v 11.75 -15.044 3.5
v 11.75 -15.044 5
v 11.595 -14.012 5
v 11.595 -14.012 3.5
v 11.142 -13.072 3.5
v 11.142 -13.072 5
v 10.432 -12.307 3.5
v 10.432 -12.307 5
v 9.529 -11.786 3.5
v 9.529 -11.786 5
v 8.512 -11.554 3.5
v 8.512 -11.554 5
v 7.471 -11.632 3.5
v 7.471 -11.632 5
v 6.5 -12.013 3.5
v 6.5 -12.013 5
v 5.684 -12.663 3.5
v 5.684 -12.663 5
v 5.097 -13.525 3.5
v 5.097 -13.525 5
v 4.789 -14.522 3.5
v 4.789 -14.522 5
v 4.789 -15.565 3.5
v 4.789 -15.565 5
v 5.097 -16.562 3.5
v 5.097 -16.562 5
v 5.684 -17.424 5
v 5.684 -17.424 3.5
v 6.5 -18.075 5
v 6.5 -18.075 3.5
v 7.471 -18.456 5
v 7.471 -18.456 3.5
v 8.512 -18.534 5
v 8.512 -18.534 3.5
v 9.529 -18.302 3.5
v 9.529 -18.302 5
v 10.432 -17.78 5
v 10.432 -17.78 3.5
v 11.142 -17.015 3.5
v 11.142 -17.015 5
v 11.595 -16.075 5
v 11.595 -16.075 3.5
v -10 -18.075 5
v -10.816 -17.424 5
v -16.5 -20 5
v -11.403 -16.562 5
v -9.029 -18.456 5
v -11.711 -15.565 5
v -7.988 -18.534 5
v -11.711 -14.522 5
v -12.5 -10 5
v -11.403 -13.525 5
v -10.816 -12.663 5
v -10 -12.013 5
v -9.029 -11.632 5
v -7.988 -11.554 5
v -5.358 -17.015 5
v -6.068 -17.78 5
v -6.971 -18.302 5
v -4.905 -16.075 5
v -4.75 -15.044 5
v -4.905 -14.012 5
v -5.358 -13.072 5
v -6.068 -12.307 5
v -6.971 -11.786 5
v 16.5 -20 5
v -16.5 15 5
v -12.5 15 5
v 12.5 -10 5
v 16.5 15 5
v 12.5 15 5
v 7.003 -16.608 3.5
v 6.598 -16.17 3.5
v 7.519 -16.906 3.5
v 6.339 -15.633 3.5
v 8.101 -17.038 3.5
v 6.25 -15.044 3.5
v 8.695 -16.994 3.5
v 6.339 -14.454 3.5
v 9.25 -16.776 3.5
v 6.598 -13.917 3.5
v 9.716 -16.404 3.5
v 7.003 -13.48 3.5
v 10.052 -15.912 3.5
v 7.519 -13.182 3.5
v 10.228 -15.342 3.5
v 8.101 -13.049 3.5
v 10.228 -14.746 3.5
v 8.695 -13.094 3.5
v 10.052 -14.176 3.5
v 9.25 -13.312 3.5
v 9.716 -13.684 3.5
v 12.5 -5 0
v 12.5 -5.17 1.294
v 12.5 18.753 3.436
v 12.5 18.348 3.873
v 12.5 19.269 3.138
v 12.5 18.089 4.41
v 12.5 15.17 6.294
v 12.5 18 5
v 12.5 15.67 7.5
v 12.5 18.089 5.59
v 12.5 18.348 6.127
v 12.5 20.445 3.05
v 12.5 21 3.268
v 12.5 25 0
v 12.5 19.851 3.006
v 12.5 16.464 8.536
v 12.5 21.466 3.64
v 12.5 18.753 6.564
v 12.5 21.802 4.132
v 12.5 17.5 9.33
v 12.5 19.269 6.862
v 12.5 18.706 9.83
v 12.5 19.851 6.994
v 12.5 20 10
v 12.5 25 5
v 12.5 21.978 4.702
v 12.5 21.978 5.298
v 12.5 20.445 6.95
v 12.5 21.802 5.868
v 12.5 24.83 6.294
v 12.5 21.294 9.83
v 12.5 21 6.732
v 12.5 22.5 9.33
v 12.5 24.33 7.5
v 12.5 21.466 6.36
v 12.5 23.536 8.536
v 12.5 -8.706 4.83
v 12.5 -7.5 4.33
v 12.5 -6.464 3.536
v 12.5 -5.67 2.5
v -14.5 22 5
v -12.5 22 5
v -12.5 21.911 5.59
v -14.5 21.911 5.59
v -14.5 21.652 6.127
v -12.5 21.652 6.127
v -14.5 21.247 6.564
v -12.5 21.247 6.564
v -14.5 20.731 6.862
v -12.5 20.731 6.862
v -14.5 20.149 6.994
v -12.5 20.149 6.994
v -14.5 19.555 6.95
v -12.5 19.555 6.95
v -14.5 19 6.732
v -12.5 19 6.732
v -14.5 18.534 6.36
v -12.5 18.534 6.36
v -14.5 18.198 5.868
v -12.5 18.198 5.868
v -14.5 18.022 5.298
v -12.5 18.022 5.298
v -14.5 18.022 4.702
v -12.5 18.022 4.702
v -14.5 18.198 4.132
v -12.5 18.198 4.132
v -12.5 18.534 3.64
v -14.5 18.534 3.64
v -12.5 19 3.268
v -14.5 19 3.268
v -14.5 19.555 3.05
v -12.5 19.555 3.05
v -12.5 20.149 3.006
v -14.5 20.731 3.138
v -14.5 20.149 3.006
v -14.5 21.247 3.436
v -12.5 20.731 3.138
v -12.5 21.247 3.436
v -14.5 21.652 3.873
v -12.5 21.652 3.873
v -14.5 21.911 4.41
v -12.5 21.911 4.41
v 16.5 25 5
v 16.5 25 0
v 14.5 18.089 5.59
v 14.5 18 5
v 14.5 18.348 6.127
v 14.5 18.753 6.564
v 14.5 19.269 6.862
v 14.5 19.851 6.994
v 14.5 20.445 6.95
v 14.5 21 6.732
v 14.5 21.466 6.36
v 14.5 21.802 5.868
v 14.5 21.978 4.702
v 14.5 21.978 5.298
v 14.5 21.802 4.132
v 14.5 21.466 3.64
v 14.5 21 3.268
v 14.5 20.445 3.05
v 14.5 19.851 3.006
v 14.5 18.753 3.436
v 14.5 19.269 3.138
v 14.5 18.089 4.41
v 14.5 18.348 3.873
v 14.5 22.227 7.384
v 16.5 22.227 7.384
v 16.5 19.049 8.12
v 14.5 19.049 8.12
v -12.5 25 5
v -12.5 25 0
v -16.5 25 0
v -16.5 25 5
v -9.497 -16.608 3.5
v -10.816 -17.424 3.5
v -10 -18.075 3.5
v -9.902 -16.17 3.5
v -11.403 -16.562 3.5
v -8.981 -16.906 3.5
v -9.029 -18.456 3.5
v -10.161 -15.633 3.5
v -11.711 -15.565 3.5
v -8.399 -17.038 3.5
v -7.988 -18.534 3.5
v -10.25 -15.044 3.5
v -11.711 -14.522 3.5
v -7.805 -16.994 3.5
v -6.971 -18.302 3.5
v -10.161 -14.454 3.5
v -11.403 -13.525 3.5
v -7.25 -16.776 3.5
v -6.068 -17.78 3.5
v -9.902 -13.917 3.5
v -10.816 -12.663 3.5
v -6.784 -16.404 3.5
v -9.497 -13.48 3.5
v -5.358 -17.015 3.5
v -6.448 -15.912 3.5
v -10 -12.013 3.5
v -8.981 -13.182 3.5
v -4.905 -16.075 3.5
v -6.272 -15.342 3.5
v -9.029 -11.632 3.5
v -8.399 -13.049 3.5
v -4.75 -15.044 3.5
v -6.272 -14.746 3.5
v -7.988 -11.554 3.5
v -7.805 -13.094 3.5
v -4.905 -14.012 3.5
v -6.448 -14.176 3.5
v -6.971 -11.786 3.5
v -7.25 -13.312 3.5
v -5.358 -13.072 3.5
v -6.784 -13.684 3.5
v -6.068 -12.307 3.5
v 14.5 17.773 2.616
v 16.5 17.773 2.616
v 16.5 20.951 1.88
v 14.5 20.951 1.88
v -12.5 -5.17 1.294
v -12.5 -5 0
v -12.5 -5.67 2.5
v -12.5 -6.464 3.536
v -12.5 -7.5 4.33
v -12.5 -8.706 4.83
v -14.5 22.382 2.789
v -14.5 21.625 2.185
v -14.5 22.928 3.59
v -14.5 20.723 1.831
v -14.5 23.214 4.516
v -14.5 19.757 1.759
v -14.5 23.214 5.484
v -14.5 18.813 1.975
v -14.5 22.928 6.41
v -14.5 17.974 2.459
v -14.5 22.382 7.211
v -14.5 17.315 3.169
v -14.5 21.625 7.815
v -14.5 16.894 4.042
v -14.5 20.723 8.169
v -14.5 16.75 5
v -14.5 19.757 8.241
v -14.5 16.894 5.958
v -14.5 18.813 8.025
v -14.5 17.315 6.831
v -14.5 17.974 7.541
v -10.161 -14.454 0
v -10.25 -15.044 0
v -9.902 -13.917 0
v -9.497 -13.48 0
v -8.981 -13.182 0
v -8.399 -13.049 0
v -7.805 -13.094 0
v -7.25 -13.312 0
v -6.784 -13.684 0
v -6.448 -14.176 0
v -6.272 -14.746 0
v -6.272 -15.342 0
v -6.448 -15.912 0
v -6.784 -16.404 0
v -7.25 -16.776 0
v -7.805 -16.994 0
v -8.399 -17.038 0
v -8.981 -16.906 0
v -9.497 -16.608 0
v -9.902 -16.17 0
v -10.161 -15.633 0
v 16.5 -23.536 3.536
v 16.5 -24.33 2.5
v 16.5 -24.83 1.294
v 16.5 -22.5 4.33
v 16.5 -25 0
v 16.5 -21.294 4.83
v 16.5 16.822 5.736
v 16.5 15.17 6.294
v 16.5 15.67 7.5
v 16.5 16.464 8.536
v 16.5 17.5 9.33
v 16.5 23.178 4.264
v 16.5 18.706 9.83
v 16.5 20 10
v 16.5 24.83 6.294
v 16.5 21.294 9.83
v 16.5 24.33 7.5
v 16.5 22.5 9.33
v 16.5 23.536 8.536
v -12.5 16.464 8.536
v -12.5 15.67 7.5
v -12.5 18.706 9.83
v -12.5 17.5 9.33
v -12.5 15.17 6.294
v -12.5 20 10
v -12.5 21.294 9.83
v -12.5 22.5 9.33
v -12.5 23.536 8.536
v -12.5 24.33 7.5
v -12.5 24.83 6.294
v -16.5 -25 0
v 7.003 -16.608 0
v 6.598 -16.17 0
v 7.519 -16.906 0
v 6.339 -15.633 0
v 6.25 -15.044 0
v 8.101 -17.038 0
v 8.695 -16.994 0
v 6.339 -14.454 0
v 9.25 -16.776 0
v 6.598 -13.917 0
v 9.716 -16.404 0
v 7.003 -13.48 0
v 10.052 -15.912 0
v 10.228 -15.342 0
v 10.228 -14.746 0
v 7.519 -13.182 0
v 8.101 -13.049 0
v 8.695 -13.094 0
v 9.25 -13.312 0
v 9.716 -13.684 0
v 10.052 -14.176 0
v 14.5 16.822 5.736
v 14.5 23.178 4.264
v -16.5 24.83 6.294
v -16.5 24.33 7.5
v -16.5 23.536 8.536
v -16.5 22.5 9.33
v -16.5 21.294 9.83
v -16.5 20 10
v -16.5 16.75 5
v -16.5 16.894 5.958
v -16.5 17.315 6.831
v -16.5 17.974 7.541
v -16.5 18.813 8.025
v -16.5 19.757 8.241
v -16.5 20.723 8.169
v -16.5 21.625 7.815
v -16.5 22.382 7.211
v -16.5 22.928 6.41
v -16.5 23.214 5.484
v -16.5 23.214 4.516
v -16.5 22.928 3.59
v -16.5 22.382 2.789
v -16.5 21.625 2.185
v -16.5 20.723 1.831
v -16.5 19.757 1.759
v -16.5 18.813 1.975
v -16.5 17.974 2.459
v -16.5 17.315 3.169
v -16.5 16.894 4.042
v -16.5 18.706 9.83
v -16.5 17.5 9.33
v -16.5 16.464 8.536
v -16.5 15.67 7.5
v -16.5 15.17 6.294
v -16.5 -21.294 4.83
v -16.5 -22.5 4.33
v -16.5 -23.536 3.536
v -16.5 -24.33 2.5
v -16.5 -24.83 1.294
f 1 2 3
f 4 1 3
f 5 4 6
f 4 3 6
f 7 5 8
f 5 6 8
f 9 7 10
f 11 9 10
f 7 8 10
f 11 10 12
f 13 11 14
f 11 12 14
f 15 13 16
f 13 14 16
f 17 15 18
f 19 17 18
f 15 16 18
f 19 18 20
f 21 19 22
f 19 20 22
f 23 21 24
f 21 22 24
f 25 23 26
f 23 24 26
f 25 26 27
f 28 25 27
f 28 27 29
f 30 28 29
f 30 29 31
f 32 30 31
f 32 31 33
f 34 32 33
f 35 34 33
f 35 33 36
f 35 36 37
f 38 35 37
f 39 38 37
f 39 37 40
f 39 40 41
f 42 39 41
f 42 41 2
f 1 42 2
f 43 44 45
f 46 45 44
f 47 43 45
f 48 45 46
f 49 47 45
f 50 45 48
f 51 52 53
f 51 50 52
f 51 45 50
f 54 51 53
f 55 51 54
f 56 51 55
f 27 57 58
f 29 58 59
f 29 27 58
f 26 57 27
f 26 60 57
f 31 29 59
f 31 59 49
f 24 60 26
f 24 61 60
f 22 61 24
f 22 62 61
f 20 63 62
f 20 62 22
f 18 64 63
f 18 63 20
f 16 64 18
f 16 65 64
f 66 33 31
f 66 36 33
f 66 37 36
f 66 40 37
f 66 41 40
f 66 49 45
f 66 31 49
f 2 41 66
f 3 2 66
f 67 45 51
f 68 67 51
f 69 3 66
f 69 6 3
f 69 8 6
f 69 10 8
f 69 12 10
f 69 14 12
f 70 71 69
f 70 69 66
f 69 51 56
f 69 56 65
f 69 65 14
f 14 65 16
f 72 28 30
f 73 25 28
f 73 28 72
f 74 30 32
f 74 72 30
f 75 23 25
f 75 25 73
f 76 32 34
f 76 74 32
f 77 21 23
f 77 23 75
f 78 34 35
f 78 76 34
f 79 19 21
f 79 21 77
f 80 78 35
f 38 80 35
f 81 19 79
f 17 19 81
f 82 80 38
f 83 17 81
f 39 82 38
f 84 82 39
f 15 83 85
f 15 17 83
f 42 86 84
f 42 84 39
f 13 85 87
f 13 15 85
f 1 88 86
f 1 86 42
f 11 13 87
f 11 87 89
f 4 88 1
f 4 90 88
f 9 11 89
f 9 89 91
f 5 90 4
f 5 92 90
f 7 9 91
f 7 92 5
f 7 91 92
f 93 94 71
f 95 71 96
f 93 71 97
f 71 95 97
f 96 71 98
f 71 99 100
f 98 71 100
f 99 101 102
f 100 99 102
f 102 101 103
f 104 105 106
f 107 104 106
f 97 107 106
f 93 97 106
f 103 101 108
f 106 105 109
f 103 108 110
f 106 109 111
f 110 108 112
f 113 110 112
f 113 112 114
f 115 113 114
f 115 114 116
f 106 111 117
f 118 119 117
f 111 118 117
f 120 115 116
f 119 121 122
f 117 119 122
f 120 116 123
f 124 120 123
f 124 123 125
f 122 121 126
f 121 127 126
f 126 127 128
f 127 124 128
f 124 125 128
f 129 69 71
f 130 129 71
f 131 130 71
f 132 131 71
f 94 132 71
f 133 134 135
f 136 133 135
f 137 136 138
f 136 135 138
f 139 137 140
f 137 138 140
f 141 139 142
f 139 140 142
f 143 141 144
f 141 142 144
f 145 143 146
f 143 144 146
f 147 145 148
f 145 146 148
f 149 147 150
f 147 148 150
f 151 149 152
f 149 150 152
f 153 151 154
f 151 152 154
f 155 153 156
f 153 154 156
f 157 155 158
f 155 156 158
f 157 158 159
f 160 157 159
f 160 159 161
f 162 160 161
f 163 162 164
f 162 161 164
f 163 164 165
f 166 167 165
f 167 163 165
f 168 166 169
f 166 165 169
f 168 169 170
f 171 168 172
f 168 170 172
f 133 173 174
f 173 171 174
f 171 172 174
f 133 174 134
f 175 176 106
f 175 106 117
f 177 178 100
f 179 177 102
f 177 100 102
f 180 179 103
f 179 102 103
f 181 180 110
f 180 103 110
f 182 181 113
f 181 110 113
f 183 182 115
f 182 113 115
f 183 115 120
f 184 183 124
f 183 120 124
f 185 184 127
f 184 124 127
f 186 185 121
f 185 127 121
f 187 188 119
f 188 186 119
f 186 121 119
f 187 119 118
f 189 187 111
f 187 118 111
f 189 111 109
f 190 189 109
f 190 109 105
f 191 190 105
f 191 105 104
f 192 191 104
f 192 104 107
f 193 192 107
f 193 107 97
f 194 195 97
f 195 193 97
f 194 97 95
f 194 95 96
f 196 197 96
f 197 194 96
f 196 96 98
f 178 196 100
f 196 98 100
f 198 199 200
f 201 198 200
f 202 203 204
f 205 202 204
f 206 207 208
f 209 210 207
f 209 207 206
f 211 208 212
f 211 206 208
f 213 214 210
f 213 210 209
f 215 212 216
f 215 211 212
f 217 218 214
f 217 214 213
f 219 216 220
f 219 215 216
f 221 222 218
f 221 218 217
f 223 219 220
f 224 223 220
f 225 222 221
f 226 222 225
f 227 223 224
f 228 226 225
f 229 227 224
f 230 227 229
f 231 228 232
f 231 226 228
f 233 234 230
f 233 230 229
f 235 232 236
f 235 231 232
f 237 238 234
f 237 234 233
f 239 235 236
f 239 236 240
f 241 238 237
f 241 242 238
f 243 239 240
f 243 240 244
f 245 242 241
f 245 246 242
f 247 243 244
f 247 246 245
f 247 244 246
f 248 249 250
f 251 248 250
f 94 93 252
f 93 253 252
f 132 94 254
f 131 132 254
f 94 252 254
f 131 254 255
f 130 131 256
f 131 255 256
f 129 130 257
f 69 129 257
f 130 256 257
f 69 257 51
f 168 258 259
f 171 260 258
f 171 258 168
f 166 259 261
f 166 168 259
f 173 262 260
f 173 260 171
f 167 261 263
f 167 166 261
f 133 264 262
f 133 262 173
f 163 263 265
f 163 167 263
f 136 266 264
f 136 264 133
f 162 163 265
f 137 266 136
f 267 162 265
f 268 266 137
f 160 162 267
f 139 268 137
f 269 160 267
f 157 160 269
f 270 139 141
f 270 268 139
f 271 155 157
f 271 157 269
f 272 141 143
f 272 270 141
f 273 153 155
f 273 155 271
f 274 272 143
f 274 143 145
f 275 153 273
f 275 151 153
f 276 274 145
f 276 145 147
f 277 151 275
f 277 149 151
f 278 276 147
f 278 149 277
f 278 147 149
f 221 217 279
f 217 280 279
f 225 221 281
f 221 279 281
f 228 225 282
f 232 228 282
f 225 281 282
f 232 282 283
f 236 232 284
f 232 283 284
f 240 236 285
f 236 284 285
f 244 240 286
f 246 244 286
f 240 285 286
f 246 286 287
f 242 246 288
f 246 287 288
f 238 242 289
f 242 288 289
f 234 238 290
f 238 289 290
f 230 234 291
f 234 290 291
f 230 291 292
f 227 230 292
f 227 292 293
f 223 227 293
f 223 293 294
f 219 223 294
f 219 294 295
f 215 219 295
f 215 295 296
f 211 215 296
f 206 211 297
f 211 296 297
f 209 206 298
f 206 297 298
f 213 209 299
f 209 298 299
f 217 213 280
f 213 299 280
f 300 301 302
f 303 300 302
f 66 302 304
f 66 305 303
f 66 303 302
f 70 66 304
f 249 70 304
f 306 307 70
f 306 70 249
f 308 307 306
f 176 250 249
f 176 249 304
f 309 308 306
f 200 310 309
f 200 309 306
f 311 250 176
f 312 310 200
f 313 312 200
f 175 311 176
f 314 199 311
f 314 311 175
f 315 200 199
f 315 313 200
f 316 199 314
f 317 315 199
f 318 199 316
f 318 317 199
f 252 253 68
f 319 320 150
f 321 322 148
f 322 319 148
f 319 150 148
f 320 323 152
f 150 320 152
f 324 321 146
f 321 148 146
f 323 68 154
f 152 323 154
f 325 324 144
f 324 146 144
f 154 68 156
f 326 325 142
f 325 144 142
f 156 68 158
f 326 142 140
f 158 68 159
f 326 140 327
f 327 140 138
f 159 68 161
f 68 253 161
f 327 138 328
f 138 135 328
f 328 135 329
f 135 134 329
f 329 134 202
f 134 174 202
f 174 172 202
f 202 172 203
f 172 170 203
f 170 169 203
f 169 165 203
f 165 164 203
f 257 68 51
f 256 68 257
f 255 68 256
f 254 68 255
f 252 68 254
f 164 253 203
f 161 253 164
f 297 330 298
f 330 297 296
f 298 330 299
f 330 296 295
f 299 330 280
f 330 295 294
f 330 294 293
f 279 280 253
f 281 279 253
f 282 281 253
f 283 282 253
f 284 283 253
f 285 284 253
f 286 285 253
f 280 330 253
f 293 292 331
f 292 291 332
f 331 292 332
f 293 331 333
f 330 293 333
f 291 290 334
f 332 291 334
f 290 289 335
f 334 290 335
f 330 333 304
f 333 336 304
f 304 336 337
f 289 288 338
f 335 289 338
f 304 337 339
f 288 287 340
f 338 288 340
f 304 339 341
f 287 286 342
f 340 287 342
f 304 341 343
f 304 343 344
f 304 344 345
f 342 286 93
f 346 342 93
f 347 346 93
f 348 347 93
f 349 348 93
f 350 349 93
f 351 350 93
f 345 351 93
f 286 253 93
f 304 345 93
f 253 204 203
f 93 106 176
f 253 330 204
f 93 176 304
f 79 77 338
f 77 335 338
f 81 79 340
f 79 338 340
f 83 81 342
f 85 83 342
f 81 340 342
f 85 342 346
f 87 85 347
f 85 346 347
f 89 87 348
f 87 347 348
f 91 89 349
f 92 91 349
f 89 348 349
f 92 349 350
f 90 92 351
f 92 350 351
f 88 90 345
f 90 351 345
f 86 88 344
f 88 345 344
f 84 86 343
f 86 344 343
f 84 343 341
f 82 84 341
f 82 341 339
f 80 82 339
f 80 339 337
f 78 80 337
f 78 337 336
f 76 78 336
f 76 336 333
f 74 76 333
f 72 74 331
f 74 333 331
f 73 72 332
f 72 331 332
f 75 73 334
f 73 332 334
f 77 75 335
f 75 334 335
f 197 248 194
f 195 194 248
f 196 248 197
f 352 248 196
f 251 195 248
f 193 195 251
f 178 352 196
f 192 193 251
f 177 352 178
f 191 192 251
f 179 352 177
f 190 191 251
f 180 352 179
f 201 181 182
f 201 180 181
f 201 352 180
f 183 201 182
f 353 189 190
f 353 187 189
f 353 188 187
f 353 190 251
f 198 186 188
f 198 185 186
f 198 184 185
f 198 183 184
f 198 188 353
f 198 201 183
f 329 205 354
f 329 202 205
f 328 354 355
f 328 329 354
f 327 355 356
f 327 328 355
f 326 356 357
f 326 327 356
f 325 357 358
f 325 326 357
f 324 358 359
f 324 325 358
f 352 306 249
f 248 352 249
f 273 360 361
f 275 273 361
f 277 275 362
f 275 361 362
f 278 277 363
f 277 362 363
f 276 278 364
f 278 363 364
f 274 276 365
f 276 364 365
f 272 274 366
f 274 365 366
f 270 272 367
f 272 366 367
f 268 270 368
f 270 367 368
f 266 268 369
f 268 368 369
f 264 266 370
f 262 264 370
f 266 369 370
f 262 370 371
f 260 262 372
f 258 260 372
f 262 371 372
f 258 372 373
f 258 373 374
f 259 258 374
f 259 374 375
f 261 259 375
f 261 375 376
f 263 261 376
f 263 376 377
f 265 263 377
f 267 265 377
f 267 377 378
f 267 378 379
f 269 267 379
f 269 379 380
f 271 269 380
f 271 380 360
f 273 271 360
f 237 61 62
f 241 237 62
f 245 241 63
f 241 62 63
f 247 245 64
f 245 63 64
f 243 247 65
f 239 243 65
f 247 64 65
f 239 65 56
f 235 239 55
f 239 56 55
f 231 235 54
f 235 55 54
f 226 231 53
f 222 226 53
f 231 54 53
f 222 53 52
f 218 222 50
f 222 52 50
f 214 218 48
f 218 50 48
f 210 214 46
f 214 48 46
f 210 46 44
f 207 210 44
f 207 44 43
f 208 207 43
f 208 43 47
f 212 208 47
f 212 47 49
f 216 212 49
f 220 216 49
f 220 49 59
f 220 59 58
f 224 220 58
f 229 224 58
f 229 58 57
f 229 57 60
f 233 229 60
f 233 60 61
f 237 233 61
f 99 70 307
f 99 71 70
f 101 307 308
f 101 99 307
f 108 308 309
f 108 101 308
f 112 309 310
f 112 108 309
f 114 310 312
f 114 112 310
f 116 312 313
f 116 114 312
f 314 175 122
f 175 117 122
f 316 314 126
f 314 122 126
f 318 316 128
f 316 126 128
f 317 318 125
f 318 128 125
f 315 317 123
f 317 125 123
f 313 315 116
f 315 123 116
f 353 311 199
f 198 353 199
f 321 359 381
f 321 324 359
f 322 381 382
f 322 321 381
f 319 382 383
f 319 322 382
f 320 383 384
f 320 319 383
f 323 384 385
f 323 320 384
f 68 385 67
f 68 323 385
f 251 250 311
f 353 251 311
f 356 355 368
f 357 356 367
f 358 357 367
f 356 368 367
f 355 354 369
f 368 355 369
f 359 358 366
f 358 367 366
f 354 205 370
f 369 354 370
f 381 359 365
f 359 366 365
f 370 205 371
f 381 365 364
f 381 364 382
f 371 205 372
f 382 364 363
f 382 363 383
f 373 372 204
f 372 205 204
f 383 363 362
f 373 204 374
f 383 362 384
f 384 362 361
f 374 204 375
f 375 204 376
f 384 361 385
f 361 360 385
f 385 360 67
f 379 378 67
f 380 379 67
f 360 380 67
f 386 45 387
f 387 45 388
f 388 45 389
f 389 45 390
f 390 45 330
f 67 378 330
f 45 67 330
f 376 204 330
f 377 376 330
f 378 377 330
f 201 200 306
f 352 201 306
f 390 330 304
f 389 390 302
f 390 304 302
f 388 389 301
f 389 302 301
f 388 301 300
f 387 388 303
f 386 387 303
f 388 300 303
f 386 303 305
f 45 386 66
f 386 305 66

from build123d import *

# Parameters (mm, degrees)
F1_DEPTH        = 5
F2_W            = 10
F2_H            = 10
F3_DEPTH        = 4
F5_D            = 4
F5_CBORE_D      = 6.5
F5_CBORE_DEPTH  = 2
F7_DEPTH        = 4
F9_D            = 4
F10_R           = 2
F11_DEPTH       = 2
F12_R           = 4.99999
F14_D           = 4
F14_CBORE_D     = 7
F14_CBORE_DEPTH = 1.5


# Not quite as in the source:
# - a fillet or chamfer is up to 0.001 mm smaller than in the source, because OpenCascade refuses the exact size


with BuildPart() as f1:
    # F0 (on Top) → F1 (new body)
    with BuildSketch(Plane.XY):
        Polygon((16.5, -25), (16.5, 25), (12.5, 25), (12.5, -5), (-12.5, -5), (-12.5, 25), (-16.5, 25), (-16.5, -25), align=None)
    extrude(amount=F1_DEPTH)

    # F2 (on face) → F3 (join)
    with BuildSketch(Plane(origin=(-16.5, 0, 0), x_dir=(0, -1, 0), z_dir=(-1, 0, 0))):
        with Locations((-20, 5)):
            Rectangle(F2_W, F2_H)
    extrude(amount=-F3_DEPTH)

    # F5 (through all)
    with Locations(Plane(origin=(-16.5, 0, 0), x_dir=(0, -1, 0), z_dir=(-1, 0, 0))):
        with Locations((-20, 5)):
            CounterBoreHole(F5_D / 2, F5_CBORE_D / 2, F5_CBORE_DEPTH)

    # F6 (on face) → F7 (join)
    with BuildSketch(Plane.YZ.offset(16.5)):
        with BuildLine():
            Line((22, 5), (25, 5))
            Line((25, 5), (25, 10))
            Line((25, 10), (15, 10))
            Line((15, 10), (15, 5))
            Line((15, 5), (18, 5))
            ThreePointArc((18, 5), (20, 3), (22, 5))
        make_face()
    extrude(amount=-F7_DEPTH)

    # F9 (through all)
    with Locations(Plane.YZ.offset(16.5)):
        with Locations((20, 5)):
            Hole(F9_D / 2)

    # F10 (on face) → F11 (cut)
    with BuildSketch(Plane.YZ.offset(16.5)):
        Polygon((20.9512871128, 1.8797618421), (23.1778490671, 4.263719727), (22.2265619542, 7.383957885), (19.0487128872, 8.1202381579), (16.8221509329, 5.736280273), (17.7734380458, 2.616042115), align=None)
        with Locations((20, 5)):
            Circle(F10_R, mode=Mode.SUBTRACT)
    extrude(amount=-F11_DEPTH, mode=Mode.SUBTRACT)

    # F12 (radius 5 in the source; OpenCascade refuses exactly that, so slightly less here)
    f12_edges = [f1.edges().sort_by_distance(p)[0] for p in [
        (14.5, 25, 10),
        (14.5, 15, 10),
        (-14.5, 15, 10),
        (-14.5, 25, 10),
        (0, -25, 5),
        (0, -5, 5),
    ]]
    fillet(f12_edges, radius=F12_R)

    # F14 (through all)
    with Locations(Plane.XY.offset(5)):
        with Locations((-8.25, -15.0438509881), (8.25, -15.0438509881)):
            CounterBoreHole(F14_D / 2, F14_CBORE_D / 2, F14_CBORE_DEPTH)


solid = f1.part
